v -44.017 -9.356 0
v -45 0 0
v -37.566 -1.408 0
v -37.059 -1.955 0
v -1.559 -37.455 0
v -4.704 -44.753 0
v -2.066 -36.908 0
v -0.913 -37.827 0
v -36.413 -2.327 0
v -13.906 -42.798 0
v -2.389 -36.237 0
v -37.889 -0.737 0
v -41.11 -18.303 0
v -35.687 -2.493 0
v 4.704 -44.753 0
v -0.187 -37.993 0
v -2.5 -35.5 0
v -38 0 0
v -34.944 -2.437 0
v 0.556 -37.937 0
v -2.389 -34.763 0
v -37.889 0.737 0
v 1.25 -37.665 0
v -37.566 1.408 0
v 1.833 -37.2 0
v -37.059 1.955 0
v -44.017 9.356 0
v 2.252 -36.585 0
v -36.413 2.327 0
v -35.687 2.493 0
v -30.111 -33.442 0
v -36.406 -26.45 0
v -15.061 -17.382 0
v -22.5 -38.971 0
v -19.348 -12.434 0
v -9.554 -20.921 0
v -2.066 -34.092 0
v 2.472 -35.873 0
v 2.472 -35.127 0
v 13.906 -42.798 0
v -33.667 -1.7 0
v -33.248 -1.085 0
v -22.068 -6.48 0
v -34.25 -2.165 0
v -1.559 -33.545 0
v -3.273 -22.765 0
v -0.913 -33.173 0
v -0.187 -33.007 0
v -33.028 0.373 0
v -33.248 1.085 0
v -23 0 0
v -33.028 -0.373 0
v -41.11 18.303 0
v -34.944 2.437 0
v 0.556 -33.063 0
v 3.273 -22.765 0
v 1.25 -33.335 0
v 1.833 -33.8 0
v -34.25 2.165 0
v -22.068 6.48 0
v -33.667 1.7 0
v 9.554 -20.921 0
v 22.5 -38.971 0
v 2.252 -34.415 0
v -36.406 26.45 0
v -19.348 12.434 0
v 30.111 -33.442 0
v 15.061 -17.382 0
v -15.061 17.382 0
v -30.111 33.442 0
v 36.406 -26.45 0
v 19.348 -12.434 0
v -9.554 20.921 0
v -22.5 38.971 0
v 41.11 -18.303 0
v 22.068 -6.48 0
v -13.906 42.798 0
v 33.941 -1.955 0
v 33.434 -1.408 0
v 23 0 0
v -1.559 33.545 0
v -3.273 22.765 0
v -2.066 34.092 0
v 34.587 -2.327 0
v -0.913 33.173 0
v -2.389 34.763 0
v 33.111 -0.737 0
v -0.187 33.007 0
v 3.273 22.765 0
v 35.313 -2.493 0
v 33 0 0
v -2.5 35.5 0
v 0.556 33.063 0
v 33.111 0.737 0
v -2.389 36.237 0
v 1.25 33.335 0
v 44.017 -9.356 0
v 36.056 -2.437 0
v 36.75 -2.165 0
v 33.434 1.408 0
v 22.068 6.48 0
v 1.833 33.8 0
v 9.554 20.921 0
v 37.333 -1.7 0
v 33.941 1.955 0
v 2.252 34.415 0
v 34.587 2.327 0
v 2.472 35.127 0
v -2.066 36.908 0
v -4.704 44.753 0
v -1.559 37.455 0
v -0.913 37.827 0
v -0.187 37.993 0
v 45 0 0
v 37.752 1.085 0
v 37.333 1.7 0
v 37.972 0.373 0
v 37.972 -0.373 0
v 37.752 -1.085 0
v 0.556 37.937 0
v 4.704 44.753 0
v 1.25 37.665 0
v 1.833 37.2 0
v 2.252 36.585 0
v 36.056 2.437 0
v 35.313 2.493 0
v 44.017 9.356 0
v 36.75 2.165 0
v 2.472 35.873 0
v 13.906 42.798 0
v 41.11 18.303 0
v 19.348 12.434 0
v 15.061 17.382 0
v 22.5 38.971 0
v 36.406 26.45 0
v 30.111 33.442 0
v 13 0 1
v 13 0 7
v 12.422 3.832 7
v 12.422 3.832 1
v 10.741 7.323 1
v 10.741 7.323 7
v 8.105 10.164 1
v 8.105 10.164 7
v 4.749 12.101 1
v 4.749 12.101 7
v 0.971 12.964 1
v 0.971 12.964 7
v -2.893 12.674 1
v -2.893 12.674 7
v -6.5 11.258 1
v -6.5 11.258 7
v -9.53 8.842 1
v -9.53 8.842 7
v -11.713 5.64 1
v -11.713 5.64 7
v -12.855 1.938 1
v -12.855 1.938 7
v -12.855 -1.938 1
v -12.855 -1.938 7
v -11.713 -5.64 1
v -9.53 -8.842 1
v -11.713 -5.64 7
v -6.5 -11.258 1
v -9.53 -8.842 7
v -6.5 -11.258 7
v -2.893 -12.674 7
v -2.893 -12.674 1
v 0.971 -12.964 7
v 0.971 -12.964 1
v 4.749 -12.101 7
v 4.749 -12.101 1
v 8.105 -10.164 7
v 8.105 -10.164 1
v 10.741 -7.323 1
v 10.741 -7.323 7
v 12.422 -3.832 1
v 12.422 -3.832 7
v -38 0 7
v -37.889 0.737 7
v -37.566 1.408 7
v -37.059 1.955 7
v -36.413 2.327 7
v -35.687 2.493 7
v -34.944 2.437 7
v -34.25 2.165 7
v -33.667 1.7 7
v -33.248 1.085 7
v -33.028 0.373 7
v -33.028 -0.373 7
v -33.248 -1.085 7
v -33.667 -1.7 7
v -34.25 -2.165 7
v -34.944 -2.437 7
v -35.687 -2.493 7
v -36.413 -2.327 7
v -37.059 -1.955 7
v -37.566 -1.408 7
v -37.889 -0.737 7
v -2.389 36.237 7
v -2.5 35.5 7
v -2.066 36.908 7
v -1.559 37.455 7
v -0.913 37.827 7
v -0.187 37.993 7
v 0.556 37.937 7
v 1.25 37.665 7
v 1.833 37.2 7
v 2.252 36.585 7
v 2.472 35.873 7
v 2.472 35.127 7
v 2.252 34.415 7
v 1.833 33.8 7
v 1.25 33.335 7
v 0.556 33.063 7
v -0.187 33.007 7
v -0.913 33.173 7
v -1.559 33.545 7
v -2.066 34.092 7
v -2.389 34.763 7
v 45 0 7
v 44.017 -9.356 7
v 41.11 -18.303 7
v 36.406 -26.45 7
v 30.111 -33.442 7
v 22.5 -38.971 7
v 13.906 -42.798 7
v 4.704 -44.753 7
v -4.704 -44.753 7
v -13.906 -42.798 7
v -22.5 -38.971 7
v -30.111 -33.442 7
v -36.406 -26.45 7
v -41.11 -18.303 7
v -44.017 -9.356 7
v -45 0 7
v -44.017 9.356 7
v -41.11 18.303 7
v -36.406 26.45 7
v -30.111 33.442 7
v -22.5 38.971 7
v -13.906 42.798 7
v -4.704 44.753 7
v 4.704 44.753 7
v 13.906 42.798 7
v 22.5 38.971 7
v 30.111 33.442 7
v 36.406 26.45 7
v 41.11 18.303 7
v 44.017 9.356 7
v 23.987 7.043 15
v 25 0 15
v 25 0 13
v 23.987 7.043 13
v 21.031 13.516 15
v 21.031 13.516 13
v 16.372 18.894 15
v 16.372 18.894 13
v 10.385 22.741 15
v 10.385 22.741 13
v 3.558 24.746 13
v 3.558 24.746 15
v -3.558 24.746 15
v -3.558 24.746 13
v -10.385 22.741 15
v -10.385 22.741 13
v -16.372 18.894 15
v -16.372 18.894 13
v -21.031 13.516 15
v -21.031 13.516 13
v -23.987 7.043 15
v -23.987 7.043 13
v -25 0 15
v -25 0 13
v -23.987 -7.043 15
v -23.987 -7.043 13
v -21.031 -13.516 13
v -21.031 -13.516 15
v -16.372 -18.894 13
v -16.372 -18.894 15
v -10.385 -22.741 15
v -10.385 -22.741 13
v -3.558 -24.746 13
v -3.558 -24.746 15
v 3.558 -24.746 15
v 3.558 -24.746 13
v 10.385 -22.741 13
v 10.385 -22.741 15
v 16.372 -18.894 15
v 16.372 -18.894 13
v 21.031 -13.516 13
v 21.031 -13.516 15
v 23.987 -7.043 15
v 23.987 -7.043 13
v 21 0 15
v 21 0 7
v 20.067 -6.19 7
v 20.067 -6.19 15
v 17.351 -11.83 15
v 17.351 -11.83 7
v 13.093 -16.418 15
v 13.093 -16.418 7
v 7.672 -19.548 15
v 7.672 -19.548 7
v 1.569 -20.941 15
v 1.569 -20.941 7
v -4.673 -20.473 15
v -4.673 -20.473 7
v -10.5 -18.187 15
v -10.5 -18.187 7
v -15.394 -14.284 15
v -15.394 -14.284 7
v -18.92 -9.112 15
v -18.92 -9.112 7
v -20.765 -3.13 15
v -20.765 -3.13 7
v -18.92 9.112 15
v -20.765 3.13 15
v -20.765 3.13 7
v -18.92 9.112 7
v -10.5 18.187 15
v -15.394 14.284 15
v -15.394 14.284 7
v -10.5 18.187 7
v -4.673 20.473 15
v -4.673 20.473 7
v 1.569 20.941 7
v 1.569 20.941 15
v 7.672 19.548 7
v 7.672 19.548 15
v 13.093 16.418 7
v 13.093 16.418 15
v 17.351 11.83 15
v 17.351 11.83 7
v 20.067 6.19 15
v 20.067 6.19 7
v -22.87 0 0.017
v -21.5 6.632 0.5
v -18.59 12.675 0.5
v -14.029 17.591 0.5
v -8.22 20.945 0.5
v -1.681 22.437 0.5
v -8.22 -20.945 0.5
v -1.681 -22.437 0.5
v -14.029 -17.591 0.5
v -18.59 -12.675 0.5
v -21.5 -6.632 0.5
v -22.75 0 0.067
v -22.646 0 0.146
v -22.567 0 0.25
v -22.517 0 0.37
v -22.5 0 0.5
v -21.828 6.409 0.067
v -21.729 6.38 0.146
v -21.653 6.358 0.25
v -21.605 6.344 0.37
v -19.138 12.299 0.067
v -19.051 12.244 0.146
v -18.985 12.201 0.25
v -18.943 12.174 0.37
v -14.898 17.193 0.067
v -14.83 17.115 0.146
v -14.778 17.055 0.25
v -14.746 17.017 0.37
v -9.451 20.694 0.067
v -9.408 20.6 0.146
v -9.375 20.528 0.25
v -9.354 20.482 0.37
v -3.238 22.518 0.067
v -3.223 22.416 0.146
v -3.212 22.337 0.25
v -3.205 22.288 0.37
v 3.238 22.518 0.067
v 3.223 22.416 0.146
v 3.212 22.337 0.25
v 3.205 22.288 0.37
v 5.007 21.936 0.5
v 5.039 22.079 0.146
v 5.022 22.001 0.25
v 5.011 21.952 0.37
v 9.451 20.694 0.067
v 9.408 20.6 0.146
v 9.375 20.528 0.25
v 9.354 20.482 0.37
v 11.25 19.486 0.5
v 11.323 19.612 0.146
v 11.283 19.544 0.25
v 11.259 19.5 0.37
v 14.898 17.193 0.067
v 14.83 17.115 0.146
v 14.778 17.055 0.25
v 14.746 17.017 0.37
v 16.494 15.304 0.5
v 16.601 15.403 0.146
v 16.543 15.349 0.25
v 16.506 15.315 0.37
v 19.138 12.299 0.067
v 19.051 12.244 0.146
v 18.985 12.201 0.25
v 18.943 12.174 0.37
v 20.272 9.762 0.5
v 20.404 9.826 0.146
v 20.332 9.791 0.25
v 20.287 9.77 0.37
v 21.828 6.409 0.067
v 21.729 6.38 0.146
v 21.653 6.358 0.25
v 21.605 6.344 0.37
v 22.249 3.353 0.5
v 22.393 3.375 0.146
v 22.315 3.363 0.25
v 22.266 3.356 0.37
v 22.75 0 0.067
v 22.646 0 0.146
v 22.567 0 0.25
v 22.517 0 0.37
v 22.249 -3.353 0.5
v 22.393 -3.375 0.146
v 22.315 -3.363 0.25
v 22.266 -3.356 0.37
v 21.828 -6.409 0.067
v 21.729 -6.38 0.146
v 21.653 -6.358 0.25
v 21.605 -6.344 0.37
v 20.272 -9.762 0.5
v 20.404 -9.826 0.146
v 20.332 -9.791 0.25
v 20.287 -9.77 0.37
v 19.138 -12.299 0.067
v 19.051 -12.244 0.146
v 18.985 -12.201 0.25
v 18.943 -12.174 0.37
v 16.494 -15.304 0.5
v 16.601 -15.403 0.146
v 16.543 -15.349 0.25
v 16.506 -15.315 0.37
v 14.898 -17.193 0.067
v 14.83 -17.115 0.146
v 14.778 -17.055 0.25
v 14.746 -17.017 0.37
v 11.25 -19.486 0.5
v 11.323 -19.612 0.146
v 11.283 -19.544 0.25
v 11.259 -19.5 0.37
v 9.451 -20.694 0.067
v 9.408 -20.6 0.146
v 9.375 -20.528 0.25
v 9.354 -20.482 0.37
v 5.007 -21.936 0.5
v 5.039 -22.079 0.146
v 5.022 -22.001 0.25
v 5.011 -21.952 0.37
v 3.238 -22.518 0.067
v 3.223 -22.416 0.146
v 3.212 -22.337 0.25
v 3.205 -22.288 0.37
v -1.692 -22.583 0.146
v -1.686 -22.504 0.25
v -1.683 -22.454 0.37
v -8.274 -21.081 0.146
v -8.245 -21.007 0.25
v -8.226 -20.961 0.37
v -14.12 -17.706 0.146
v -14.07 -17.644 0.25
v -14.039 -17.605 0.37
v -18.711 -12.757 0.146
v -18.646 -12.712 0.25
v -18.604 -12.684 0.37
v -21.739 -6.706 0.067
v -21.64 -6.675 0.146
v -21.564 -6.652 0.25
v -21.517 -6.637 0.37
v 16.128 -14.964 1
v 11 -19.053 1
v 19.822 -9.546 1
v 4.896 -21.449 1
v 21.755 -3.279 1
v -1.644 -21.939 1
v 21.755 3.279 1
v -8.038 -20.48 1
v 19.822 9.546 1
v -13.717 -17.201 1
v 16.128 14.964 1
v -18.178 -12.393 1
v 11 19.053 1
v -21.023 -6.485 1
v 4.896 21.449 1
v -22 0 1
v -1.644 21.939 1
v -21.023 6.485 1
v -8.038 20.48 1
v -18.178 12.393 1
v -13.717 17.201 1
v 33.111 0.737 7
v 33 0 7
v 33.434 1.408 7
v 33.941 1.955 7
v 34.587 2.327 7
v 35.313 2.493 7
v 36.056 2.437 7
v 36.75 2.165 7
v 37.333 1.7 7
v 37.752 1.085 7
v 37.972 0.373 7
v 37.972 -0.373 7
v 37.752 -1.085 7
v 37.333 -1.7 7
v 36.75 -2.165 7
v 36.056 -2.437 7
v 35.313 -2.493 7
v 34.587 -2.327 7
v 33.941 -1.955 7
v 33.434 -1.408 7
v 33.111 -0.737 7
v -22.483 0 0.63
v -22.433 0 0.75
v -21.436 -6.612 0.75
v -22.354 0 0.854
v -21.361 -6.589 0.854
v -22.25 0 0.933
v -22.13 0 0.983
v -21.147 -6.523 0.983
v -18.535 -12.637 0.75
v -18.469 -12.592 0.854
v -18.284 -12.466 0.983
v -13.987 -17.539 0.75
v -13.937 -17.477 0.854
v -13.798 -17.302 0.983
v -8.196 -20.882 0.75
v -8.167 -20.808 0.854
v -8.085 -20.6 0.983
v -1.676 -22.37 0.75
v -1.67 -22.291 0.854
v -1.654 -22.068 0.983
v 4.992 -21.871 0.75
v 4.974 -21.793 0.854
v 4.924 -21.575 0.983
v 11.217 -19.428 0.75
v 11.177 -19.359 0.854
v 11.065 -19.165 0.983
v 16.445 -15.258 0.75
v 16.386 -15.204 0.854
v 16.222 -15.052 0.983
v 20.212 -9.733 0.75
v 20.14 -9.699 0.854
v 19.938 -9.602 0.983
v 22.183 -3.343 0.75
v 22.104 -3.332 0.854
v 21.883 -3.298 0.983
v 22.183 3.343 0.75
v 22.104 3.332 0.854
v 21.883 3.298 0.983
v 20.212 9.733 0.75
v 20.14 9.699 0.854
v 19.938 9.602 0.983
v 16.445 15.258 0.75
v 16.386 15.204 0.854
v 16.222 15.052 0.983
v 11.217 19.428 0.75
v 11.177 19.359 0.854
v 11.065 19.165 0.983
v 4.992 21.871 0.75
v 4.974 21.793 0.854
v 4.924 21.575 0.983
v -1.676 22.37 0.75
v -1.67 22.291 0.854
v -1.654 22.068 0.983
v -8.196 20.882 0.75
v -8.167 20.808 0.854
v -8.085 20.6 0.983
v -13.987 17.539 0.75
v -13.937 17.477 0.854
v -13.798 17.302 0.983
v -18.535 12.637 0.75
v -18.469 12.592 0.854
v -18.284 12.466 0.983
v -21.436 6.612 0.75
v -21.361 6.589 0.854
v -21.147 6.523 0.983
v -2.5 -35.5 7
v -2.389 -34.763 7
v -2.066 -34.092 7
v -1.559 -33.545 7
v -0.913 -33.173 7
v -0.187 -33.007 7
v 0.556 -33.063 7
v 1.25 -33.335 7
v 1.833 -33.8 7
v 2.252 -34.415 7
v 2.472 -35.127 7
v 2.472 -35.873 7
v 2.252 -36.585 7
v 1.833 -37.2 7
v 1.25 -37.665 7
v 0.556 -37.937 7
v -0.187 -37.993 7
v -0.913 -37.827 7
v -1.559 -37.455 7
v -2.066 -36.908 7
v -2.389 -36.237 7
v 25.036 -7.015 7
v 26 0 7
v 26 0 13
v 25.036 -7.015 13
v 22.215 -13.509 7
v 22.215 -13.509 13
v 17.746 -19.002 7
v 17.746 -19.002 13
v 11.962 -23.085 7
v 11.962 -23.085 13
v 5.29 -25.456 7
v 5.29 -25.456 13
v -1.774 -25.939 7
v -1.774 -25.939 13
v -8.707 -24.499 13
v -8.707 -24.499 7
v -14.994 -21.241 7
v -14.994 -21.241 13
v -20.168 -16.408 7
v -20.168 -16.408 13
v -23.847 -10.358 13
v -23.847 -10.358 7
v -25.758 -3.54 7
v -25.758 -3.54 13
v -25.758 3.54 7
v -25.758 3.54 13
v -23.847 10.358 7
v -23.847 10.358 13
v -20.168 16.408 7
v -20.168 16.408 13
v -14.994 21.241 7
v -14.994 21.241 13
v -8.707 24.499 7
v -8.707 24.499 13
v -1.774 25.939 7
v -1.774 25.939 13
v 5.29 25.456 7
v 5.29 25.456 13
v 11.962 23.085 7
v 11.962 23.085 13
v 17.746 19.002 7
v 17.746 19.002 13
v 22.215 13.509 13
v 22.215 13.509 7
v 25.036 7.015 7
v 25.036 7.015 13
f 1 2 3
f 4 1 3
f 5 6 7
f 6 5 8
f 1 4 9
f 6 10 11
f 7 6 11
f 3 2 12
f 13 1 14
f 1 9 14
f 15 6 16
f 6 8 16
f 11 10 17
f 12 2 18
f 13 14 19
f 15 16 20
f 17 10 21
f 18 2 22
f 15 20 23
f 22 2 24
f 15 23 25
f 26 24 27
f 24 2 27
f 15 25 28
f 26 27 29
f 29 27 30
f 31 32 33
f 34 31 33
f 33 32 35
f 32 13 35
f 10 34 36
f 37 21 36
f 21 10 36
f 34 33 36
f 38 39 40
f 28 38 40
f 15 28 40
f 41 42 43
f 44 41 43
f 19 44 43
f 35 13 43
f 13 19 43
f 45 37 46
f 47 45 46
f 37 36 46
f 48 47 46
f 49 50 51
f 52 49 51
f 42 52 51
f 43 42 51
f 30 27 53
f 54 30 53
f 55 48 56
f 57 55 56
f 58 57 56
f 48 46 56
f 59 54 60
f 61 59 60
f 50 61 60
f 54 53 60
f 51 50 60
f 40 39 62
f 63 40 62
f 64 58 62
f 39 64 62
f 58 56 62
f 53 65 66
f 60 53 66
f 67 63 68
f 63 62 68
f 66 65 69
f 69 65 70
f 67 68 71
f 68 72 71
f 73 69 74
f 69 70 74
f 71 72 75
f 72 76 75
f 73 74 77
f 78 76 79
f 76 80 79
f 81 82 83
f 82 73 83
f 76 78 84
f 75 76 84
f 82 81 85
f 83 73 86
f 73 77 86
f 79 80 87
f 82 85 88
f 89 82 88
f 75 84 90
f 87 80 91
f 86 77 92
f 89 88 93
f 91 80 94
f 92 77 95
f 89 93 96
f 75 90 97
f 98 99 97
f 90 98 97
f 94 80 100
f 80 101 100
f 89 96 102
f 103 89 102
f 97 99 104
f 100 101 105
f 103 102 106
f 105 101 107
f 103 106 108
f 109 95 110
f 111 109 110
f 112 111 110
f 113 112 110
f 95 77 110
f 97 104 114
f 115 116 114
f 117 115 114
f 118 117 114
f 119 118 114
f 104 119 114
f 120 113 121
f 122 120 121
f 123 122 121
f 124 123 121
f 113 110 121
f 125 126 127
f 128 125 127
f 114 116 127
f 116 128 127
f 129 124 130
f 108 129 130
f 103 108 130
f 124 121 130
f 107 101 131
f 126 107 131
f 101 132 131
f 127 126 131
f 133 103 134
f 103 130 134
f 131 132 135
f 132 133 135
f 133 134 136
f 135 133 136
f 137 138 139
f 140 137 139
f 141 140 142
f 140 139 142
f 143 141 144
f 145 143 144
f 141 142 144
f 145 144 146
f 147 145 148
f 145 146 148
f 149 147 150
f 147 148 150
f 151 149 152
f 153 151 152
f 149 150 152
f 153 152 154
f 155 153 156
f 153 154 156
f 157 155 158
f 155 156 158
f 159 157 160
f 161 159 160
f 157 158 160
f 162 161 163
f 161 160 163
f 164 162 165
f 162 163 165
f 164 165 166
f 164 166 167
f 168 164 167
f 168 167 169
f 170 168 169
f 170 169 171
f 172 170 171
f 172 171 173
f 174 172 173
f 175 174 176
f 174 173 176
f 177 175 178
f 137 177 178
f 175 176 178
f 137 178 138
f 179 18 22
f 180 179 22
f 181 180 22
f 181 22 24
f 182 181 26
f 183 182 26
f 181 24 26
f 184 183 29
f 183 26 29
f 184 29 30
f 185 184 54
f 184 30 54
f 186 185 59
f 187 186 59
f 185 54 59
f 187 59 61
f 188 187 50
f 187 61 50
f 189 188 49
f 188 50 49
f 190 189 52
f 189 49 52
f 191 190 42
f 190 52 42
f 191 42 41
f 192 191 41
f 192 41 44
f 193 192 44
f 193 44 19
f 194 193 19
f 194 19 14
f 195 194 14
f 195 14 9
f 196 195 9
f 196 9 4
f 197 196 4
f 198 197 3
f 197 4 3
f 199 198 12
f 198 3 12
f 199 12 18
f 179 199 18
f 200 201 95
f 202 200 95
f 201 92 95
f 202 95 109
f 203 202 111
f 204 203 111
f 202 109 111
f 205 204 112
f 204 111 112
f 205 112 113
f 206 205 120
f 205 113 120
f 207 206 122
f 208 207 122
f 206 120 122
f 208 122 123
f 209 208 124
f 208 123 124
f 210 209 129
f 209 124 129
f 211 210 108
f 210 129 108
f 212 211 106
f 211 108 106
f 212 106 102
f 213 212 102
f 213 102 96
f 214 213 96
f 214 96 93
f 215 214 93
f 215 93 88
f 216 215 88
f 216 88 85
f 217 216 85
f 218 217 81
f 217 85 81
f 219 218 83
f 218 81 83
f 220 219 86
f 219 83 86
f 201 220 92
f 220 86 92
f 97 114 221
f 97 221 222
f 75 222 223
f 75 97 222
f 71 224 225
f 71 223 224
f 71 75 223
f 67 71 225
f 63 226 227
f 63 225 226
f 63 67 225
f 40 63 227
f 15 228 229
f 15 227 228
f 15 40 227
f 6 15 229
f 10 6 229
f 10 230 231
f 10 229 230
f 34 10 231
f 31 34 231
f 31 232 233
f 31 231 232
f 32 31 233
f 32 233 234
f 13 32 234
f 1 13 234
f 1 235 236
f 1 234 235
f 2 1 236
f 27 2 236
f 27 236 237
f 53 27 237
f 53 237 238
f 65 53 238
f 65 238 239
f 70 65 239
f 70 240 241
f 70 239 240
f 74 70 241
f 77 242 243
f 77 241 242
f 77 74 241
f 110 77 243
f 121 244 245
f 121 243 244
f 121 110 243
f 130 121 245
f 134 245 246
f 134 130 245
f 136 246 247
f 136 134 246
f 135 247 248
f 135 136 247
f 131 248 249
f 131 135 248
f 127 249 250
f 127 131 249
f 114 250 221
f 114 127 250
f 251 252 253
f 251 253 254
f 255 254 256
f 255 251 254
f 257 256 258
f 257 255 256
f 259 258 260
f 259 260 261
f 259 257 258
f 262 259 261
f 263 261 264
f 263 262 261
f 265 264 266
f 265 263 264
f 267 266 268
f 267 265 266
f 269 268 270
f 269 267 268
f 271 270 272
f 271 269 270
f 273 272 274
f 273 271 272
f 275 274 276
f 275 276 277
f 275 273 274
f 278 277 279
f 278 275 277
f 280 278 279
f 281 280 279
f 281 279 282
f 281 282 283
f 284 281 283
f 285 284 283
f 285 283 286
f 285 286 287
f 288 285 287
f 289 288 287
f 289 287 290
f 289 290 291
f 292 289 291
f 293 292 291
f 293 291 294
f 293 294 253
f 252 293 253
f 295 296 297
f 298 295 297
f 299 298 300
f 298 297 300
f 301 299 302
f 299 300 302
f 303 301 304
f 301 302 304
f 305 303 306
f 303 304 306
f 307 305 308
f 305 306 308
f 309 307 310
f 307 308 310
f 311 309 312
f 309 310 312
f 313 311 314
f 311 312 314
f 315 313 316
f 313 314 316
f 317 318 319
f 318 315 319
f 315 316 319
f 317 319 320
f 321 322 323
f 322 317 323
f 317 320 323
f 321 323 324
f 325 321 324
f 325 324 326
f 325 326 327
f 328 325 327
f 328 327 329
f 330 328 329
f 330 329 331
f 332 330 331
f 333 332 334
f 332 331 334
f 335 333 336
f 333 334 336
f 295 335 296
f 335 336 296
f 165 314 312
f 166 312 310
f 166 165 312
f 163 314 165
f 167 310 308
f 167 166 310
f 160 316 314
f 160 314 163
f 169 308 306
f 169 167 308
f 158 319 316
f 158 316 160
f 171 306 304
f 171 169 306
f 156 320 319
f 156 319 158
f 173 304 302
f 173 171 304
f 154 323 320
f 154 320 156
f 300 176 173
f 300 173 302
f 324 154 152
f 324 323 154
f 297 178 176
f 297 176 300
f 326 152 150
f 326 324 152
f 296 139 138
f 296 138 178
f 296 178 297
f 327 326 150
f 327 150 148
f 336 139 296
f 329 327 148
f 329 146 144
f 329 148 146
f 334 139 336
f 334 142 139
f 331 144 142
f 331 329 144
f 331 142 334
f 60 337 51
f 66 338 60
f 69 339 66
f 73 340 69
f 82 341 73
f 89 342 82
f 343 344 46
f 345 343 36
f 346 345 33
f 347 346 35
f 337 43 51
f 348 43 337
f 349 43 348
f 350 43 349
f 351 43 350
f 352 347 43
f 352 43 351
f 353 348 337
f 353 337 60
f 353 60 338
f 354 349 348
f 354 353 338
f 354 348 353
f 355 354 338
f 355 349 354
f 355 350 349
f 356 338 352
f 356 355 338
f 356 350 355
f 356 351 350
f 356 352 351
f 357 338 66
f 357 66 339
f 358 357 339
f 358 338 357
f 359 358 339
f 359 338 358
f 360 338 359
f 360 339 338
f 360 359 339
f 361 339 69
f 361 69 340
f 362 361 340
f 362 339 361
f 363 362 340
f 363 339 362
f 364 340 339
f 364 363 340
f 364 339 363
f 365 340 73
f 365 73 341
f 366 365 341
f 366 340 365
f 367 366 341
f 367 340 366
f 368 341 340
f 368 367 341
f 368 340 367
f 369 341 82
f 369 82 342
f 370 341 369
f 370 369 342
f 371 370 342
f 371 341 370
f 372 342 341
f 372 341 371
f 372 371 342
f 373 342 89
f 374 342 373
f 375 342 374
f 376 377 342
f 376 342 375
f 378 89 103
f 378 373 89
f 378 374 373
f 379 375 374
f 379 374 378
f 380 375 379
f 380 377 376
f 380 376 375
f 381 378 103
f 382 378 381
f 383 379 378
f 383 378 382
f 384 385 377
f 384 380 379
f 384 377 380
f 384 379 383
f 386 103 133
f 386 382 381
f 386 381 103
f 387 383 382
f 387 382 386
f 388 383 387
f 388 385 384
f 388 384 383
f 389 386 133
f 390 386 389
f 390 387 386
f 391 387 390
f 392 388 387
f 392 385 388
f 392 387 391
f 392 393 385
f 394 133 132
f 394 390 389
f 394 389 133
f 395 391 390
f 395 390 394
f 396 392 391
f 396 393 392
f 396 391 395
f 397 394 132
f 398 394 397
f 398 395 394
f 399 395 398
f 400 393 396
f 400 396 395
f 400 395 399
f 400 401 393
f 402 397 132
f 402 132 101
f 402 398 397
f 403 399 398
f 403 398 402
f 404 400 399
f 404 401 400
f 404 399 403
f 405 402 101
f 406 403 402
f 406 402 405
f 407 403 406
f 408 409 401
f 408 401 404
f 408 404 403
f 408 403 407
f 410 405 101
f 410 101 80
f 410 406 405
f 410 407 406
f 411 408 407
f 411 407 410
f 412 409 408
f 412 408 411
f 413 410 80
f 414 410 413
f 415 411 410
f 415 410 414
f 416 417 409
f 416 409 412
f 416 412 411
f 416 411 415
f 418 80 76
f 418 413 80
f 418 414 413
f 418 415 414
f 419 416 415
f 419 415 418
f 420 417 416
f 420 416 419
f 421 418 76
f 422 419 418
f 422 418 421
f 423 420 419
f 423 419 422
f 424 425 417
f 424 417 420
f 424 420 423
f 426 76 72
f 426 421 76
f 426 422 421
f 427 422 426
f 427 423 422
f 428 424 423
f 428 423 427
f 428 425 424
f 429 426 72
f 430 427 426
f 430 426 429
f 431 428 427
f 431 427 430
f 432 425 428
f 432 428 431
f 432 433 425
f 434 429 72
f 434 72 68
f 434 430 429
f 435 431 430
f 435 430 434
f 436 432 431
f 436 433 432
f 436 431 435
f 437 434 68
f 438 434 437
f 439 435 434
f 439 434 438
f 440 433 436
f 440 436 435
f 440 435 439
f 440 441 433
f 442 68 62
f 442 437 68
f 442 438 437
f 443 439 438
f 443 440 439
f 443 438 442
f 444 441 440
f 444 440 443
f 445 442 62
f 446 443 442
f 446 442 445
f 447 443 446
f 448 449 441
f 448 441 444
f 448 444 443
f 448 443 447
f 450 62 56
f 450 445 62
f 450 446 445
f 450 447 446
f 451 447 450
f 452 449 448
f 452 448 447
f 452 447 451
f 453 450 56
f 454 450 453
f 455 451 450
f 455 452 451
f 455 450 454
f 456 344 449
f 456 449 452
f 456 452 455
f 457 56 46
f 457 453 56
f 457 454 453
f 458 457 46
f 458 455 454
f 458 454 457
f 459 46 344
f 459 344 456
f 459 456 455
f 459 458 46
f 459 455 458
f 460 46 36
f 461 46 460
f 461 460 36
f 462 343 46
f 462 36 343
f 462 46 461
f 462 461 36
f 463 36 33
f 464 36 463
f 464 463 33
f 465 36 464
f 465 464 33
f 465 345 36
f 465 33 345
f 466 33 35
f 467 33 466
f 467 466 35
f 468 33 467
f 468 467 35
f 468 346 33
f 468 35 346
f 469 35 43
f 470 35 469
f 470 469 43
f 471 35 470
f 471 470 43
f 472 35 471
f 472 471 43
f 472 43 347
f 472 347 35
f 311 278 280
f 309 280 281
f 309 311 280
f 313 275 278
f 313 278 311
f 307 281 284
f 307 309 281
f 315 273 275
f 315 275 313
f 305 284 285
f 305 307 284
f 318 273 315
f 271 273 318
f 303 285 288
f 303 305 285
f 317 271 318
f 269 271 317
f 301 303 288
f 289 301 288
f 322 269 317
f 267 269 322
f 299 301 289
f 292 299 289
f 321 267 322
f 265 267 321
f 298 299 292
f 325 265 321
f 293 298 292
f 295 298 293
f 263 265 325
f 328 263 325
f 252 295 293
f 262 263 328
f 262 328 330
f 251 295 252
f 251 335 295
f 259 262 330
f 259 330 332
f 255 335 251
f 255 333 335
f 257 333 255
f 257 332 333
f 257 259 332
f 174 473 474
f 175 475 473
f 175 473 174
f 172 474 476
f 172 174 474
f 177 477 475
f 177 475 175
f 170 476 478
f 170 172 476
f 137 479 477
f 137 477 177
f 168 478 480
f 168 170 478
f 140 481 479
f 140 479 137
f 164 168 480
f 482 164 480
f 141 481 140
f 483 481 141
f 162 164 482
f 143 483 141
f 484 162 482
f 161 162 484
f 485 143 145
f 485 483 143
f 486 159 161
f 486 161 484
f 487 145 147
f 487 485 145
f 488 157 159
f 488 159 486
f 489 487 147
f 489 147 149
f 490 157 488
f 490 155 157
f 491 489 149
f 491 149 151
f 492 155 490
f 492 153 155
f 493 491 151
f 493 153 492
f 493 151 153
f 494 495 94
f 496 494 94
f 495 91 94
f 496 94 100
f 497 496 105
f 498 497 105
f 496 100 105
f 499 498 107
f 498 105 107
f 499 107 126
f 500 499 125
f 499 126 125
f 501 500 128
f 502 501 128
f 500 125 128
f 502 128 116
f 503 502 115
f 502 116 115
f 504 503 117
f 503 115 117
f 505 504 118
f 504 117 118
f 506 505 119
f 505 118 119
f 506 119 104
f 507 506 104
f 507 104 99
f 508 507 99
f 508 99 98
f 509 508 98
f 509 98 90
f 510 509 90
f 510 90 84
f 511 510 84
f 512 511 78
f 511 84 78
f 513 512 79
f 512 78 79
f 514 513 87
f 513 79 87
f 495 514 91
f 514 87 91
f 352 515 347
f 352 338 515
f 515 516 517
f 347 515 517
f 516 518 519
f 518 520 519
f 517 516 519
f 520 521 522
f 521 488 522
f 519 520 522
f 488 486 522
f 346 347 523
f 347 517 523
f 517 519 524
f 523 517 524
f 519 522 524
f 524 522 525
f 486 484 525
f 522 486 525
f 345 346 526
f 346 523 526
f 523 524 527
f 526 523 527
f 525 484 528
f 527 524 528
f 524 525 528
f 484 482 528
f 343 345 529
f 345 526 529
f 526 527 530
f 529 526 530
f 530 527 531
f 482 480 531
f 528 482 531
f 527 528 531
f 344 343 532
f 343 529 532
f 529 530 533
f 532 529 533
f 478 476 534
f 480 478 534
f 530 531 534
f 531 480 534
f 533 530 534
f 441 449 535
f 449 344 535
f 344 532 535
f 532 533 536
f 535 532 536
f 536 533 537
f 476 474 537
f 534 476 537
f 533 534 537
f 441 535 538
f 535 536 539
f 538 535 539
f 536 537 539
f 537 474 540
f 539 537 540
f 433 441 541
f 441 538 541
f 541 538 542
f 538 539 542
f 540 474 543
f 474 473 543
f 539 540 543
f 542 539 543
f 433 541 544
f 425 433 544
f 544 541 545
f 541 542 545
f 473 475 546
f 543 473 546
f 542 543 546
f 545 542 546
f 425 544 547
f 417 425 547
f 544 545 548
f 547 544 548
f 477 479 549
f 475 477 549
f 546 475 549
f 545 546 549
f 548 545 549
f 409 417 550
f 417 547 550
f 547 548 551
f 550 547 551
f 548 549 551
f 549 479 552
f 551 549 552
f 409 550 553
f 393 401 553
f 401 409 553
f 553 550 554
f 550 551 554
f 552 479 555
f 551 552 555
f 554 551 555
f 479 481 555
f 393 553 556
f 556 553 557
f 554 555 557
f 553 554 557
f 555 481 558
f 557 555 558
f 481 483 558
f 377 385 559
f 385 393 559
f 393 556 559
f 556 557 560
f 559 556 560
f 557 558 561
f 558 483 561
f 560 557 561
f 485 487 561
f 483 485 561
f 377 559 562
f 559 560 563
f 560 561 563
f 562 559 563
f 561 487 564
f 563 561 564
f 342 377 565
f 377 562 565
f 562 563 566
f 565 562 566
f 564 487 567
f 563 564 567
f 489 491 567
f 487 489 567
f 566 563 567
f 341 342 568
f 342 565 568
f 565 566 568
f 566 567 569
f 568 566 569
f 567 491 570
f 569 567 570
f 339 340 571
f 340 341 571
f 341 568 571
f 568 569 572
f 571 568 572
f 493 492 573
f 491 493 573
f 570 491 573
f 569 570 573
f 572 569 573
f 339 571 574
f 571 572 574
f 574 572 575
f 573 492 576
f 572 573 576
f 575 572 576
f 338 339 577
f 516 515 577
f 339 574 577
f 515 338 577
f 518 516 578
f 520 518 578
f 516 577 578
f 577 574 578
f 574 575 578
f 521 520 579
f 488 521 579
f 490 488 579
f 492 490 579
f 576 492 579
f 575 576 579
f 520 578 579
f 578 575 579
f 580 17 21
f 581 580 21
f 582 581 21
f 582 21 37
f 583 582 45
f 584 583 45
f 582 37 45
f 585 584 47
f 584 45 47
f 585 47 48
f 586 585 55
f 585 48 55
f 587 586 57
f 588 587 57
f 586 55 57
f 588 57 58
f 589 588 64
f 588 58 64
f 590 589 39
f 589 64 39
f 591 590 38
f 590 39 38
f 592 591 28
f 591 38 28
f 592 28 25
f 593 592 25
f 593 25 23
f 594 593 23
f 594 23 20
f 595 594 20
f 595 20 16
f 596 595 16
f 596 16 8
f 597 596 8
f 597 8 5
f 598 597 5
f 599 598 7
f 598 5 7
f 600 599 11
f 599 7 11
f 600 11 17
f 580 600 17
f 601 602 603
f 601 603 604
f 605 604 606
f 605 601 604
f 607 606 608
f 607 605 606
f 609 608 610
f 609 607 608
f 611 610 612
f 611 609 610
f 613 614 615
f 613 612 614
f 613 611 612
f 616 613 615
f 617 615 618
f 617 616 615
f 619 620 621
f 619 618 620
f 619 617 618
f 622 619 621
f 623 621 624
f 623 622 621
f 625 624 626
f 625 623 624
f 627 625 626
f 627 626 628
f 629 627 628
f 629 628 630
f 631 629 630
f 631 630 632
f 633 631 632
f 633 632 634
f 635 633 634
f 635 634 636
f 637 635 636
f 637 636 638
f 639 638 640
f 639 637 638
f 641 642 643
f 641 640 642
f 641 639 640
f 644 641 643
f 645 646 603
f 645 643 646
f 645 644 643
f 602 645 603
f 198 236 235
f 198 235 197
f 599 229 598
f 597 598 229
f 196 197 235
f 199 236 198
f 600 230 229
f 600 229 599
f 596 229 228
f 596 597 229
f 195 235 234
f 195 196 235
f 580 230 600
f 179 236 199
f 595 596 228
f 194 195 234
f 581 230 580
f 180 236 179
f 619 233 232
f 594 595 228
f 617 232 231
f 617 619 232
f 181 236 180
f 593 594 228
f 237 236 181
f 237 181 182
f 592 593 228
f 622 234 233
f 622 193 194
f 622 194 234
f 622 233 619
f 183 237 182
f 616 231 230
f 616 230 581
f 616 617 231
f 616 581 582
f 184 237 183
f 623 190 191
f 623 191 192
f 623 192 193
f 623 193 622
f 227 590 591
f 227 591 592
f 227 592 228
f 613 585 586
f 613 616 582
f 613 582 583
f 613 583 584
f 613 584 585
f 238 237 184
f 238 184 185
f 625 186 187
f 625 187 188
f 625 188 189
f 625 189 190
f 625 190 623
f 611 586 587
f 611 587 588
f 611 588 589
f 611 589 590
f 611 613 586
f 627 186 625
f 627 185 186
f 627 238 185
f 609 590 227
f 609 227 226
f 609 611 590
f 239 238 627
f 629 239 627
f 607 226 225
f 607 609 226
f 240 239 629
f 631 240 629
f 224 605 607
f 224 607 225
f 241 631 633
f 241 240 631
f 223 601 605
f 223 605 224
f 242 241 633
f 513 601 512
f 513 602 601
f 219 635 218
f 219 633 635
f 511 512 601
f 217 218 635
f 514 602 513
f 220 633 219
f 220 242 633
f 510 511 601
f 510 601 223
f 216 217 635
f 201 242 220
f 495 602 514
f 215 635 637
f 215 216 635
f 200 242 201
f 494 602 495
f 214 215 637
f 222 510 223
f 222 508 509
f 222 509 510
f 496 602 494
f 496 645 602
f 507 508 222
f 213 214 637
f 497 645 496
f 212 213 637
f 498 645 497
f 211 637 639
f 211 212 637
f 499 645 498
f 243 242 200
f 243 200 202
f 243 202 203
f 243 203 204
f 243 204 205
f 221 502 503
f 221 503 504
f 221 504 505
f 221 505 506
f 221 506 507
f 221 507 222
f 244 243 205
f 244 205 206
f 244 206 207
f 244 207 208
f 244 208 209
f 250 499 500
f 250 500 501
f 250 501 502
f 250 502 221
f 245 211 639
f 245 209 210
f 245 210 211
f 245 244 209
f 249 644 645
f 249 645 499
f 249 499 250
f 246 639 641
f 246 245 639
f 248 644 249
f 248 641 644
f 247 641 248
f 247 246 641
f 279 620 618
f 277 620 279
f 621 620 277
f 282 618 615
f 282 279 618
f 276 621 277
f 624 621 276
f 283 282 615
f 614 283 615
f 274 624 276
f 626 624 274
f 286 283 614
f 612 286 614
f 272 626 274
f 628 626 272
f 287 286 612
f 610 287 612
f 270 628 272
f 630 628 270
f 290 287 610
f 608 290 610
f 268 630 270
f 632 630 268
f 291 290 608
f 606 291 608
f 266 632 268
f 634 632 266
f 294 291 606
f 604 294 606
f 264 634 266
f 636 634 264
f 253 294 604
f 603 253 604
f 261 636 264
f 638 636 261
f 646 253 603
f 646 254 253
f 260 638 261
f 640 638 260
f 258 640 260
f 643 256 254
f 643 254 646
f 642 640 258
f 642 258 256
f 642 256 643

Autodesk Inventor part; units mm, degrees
ref_plane "YZ Plane" through (0, 0, 0) normal (1, 0, 0) x (0, 1, 0)
ref_plane "XZ Plane" through (0, 0, 0) normal (0, 1, 0) x (-1, 0, 0)
ref_plane "XY Plane" through (0, 0, 0) normal (0, 0, 1) x (1, 0, 0)
sketch "草图1" plane through (0, 0, 0) normal (0, 0, 1) x (1, 0, 0)
  circle A0 centre (0, 0) radius 45
  dimension "d0" = 90
extrude "拉伸1" add sketch "草图1" along normal blind 7
sketch "草图2" plane through (0, 0, 7) normal (0, 0, 1) x (1, 0, 0)
  circle A0 centre (0, 0) radius 26
  circle A1 centre (0, 0) radius 21
  dimension "d3" = 52
  dimension "d4" = 42
extrude "拉伸2" add sketch "草图2" along normal blind 8
sketch "草图3" plane through (0, 0, 15) normal (0, 0, 1) x (1, 0, 0)
  circle A0 centre (0, 0) radius 26
  circle A1 centre (0, 0) radius 25
  dimension "d7" = 52
  dimension "d8" = 50
extrude "拉伸3" cut sketch "草图3" against normal blind 2
sketch "草图4" plane through (0, 0, 7) normal (0, 0, 1) x (1, 0, 0)
  circle A0 centre (0, 0) radius 13
  dimension "d11" = 26
extrude "拉伸4" cut sketch "草图4" against normal through all
sketch "草图5" plane through (0, 0, 0) normal (0, 0, -1) x (-1, 0, 0)
  circle A0 centre (0, -35.5) radius 2.5
  circle A1 centre (35.5, 0) radius 2.5
  circle A2 centre (-35.5, 0) radius 2.5
  circle A3 centre (0, 35.5) radius 2.5
  line L0 (0, 0) -> (-3.8614, 0)
  line L1 (0, 0) -> (0, -7.2667)
  dimension "d15" = 5
  dimension "d16" = 5
  dimension "d17" = 5
  dimension "d18" = 5
  dimension "d19" = 35.5
  dimension "d20" = 35.5
  dimension "d21" = 35.5
  dimension "d22" = 35.5
  dimension "d23" = 7.2667
  dimension "d24" = 3.8614
extrude "拉伸5" cut sketch "草图5" against normal through all
sketch "草图6" plane through (0, 0, 0) normal (0, 0, -1) x (-1, 0, 0)
  circle A0 centre (0, 0) radius 22.5
  dimension "d27" = 45
extrude "拉伸6" cut sketch "草图6" against normal blind 1
fillet "圆角1" radius 0.5 2 edges at (22.5, 0, 0) (22.5, 0, 1)
equation "\"d12\" = d11"
properties part number "装填盘轴盖"
